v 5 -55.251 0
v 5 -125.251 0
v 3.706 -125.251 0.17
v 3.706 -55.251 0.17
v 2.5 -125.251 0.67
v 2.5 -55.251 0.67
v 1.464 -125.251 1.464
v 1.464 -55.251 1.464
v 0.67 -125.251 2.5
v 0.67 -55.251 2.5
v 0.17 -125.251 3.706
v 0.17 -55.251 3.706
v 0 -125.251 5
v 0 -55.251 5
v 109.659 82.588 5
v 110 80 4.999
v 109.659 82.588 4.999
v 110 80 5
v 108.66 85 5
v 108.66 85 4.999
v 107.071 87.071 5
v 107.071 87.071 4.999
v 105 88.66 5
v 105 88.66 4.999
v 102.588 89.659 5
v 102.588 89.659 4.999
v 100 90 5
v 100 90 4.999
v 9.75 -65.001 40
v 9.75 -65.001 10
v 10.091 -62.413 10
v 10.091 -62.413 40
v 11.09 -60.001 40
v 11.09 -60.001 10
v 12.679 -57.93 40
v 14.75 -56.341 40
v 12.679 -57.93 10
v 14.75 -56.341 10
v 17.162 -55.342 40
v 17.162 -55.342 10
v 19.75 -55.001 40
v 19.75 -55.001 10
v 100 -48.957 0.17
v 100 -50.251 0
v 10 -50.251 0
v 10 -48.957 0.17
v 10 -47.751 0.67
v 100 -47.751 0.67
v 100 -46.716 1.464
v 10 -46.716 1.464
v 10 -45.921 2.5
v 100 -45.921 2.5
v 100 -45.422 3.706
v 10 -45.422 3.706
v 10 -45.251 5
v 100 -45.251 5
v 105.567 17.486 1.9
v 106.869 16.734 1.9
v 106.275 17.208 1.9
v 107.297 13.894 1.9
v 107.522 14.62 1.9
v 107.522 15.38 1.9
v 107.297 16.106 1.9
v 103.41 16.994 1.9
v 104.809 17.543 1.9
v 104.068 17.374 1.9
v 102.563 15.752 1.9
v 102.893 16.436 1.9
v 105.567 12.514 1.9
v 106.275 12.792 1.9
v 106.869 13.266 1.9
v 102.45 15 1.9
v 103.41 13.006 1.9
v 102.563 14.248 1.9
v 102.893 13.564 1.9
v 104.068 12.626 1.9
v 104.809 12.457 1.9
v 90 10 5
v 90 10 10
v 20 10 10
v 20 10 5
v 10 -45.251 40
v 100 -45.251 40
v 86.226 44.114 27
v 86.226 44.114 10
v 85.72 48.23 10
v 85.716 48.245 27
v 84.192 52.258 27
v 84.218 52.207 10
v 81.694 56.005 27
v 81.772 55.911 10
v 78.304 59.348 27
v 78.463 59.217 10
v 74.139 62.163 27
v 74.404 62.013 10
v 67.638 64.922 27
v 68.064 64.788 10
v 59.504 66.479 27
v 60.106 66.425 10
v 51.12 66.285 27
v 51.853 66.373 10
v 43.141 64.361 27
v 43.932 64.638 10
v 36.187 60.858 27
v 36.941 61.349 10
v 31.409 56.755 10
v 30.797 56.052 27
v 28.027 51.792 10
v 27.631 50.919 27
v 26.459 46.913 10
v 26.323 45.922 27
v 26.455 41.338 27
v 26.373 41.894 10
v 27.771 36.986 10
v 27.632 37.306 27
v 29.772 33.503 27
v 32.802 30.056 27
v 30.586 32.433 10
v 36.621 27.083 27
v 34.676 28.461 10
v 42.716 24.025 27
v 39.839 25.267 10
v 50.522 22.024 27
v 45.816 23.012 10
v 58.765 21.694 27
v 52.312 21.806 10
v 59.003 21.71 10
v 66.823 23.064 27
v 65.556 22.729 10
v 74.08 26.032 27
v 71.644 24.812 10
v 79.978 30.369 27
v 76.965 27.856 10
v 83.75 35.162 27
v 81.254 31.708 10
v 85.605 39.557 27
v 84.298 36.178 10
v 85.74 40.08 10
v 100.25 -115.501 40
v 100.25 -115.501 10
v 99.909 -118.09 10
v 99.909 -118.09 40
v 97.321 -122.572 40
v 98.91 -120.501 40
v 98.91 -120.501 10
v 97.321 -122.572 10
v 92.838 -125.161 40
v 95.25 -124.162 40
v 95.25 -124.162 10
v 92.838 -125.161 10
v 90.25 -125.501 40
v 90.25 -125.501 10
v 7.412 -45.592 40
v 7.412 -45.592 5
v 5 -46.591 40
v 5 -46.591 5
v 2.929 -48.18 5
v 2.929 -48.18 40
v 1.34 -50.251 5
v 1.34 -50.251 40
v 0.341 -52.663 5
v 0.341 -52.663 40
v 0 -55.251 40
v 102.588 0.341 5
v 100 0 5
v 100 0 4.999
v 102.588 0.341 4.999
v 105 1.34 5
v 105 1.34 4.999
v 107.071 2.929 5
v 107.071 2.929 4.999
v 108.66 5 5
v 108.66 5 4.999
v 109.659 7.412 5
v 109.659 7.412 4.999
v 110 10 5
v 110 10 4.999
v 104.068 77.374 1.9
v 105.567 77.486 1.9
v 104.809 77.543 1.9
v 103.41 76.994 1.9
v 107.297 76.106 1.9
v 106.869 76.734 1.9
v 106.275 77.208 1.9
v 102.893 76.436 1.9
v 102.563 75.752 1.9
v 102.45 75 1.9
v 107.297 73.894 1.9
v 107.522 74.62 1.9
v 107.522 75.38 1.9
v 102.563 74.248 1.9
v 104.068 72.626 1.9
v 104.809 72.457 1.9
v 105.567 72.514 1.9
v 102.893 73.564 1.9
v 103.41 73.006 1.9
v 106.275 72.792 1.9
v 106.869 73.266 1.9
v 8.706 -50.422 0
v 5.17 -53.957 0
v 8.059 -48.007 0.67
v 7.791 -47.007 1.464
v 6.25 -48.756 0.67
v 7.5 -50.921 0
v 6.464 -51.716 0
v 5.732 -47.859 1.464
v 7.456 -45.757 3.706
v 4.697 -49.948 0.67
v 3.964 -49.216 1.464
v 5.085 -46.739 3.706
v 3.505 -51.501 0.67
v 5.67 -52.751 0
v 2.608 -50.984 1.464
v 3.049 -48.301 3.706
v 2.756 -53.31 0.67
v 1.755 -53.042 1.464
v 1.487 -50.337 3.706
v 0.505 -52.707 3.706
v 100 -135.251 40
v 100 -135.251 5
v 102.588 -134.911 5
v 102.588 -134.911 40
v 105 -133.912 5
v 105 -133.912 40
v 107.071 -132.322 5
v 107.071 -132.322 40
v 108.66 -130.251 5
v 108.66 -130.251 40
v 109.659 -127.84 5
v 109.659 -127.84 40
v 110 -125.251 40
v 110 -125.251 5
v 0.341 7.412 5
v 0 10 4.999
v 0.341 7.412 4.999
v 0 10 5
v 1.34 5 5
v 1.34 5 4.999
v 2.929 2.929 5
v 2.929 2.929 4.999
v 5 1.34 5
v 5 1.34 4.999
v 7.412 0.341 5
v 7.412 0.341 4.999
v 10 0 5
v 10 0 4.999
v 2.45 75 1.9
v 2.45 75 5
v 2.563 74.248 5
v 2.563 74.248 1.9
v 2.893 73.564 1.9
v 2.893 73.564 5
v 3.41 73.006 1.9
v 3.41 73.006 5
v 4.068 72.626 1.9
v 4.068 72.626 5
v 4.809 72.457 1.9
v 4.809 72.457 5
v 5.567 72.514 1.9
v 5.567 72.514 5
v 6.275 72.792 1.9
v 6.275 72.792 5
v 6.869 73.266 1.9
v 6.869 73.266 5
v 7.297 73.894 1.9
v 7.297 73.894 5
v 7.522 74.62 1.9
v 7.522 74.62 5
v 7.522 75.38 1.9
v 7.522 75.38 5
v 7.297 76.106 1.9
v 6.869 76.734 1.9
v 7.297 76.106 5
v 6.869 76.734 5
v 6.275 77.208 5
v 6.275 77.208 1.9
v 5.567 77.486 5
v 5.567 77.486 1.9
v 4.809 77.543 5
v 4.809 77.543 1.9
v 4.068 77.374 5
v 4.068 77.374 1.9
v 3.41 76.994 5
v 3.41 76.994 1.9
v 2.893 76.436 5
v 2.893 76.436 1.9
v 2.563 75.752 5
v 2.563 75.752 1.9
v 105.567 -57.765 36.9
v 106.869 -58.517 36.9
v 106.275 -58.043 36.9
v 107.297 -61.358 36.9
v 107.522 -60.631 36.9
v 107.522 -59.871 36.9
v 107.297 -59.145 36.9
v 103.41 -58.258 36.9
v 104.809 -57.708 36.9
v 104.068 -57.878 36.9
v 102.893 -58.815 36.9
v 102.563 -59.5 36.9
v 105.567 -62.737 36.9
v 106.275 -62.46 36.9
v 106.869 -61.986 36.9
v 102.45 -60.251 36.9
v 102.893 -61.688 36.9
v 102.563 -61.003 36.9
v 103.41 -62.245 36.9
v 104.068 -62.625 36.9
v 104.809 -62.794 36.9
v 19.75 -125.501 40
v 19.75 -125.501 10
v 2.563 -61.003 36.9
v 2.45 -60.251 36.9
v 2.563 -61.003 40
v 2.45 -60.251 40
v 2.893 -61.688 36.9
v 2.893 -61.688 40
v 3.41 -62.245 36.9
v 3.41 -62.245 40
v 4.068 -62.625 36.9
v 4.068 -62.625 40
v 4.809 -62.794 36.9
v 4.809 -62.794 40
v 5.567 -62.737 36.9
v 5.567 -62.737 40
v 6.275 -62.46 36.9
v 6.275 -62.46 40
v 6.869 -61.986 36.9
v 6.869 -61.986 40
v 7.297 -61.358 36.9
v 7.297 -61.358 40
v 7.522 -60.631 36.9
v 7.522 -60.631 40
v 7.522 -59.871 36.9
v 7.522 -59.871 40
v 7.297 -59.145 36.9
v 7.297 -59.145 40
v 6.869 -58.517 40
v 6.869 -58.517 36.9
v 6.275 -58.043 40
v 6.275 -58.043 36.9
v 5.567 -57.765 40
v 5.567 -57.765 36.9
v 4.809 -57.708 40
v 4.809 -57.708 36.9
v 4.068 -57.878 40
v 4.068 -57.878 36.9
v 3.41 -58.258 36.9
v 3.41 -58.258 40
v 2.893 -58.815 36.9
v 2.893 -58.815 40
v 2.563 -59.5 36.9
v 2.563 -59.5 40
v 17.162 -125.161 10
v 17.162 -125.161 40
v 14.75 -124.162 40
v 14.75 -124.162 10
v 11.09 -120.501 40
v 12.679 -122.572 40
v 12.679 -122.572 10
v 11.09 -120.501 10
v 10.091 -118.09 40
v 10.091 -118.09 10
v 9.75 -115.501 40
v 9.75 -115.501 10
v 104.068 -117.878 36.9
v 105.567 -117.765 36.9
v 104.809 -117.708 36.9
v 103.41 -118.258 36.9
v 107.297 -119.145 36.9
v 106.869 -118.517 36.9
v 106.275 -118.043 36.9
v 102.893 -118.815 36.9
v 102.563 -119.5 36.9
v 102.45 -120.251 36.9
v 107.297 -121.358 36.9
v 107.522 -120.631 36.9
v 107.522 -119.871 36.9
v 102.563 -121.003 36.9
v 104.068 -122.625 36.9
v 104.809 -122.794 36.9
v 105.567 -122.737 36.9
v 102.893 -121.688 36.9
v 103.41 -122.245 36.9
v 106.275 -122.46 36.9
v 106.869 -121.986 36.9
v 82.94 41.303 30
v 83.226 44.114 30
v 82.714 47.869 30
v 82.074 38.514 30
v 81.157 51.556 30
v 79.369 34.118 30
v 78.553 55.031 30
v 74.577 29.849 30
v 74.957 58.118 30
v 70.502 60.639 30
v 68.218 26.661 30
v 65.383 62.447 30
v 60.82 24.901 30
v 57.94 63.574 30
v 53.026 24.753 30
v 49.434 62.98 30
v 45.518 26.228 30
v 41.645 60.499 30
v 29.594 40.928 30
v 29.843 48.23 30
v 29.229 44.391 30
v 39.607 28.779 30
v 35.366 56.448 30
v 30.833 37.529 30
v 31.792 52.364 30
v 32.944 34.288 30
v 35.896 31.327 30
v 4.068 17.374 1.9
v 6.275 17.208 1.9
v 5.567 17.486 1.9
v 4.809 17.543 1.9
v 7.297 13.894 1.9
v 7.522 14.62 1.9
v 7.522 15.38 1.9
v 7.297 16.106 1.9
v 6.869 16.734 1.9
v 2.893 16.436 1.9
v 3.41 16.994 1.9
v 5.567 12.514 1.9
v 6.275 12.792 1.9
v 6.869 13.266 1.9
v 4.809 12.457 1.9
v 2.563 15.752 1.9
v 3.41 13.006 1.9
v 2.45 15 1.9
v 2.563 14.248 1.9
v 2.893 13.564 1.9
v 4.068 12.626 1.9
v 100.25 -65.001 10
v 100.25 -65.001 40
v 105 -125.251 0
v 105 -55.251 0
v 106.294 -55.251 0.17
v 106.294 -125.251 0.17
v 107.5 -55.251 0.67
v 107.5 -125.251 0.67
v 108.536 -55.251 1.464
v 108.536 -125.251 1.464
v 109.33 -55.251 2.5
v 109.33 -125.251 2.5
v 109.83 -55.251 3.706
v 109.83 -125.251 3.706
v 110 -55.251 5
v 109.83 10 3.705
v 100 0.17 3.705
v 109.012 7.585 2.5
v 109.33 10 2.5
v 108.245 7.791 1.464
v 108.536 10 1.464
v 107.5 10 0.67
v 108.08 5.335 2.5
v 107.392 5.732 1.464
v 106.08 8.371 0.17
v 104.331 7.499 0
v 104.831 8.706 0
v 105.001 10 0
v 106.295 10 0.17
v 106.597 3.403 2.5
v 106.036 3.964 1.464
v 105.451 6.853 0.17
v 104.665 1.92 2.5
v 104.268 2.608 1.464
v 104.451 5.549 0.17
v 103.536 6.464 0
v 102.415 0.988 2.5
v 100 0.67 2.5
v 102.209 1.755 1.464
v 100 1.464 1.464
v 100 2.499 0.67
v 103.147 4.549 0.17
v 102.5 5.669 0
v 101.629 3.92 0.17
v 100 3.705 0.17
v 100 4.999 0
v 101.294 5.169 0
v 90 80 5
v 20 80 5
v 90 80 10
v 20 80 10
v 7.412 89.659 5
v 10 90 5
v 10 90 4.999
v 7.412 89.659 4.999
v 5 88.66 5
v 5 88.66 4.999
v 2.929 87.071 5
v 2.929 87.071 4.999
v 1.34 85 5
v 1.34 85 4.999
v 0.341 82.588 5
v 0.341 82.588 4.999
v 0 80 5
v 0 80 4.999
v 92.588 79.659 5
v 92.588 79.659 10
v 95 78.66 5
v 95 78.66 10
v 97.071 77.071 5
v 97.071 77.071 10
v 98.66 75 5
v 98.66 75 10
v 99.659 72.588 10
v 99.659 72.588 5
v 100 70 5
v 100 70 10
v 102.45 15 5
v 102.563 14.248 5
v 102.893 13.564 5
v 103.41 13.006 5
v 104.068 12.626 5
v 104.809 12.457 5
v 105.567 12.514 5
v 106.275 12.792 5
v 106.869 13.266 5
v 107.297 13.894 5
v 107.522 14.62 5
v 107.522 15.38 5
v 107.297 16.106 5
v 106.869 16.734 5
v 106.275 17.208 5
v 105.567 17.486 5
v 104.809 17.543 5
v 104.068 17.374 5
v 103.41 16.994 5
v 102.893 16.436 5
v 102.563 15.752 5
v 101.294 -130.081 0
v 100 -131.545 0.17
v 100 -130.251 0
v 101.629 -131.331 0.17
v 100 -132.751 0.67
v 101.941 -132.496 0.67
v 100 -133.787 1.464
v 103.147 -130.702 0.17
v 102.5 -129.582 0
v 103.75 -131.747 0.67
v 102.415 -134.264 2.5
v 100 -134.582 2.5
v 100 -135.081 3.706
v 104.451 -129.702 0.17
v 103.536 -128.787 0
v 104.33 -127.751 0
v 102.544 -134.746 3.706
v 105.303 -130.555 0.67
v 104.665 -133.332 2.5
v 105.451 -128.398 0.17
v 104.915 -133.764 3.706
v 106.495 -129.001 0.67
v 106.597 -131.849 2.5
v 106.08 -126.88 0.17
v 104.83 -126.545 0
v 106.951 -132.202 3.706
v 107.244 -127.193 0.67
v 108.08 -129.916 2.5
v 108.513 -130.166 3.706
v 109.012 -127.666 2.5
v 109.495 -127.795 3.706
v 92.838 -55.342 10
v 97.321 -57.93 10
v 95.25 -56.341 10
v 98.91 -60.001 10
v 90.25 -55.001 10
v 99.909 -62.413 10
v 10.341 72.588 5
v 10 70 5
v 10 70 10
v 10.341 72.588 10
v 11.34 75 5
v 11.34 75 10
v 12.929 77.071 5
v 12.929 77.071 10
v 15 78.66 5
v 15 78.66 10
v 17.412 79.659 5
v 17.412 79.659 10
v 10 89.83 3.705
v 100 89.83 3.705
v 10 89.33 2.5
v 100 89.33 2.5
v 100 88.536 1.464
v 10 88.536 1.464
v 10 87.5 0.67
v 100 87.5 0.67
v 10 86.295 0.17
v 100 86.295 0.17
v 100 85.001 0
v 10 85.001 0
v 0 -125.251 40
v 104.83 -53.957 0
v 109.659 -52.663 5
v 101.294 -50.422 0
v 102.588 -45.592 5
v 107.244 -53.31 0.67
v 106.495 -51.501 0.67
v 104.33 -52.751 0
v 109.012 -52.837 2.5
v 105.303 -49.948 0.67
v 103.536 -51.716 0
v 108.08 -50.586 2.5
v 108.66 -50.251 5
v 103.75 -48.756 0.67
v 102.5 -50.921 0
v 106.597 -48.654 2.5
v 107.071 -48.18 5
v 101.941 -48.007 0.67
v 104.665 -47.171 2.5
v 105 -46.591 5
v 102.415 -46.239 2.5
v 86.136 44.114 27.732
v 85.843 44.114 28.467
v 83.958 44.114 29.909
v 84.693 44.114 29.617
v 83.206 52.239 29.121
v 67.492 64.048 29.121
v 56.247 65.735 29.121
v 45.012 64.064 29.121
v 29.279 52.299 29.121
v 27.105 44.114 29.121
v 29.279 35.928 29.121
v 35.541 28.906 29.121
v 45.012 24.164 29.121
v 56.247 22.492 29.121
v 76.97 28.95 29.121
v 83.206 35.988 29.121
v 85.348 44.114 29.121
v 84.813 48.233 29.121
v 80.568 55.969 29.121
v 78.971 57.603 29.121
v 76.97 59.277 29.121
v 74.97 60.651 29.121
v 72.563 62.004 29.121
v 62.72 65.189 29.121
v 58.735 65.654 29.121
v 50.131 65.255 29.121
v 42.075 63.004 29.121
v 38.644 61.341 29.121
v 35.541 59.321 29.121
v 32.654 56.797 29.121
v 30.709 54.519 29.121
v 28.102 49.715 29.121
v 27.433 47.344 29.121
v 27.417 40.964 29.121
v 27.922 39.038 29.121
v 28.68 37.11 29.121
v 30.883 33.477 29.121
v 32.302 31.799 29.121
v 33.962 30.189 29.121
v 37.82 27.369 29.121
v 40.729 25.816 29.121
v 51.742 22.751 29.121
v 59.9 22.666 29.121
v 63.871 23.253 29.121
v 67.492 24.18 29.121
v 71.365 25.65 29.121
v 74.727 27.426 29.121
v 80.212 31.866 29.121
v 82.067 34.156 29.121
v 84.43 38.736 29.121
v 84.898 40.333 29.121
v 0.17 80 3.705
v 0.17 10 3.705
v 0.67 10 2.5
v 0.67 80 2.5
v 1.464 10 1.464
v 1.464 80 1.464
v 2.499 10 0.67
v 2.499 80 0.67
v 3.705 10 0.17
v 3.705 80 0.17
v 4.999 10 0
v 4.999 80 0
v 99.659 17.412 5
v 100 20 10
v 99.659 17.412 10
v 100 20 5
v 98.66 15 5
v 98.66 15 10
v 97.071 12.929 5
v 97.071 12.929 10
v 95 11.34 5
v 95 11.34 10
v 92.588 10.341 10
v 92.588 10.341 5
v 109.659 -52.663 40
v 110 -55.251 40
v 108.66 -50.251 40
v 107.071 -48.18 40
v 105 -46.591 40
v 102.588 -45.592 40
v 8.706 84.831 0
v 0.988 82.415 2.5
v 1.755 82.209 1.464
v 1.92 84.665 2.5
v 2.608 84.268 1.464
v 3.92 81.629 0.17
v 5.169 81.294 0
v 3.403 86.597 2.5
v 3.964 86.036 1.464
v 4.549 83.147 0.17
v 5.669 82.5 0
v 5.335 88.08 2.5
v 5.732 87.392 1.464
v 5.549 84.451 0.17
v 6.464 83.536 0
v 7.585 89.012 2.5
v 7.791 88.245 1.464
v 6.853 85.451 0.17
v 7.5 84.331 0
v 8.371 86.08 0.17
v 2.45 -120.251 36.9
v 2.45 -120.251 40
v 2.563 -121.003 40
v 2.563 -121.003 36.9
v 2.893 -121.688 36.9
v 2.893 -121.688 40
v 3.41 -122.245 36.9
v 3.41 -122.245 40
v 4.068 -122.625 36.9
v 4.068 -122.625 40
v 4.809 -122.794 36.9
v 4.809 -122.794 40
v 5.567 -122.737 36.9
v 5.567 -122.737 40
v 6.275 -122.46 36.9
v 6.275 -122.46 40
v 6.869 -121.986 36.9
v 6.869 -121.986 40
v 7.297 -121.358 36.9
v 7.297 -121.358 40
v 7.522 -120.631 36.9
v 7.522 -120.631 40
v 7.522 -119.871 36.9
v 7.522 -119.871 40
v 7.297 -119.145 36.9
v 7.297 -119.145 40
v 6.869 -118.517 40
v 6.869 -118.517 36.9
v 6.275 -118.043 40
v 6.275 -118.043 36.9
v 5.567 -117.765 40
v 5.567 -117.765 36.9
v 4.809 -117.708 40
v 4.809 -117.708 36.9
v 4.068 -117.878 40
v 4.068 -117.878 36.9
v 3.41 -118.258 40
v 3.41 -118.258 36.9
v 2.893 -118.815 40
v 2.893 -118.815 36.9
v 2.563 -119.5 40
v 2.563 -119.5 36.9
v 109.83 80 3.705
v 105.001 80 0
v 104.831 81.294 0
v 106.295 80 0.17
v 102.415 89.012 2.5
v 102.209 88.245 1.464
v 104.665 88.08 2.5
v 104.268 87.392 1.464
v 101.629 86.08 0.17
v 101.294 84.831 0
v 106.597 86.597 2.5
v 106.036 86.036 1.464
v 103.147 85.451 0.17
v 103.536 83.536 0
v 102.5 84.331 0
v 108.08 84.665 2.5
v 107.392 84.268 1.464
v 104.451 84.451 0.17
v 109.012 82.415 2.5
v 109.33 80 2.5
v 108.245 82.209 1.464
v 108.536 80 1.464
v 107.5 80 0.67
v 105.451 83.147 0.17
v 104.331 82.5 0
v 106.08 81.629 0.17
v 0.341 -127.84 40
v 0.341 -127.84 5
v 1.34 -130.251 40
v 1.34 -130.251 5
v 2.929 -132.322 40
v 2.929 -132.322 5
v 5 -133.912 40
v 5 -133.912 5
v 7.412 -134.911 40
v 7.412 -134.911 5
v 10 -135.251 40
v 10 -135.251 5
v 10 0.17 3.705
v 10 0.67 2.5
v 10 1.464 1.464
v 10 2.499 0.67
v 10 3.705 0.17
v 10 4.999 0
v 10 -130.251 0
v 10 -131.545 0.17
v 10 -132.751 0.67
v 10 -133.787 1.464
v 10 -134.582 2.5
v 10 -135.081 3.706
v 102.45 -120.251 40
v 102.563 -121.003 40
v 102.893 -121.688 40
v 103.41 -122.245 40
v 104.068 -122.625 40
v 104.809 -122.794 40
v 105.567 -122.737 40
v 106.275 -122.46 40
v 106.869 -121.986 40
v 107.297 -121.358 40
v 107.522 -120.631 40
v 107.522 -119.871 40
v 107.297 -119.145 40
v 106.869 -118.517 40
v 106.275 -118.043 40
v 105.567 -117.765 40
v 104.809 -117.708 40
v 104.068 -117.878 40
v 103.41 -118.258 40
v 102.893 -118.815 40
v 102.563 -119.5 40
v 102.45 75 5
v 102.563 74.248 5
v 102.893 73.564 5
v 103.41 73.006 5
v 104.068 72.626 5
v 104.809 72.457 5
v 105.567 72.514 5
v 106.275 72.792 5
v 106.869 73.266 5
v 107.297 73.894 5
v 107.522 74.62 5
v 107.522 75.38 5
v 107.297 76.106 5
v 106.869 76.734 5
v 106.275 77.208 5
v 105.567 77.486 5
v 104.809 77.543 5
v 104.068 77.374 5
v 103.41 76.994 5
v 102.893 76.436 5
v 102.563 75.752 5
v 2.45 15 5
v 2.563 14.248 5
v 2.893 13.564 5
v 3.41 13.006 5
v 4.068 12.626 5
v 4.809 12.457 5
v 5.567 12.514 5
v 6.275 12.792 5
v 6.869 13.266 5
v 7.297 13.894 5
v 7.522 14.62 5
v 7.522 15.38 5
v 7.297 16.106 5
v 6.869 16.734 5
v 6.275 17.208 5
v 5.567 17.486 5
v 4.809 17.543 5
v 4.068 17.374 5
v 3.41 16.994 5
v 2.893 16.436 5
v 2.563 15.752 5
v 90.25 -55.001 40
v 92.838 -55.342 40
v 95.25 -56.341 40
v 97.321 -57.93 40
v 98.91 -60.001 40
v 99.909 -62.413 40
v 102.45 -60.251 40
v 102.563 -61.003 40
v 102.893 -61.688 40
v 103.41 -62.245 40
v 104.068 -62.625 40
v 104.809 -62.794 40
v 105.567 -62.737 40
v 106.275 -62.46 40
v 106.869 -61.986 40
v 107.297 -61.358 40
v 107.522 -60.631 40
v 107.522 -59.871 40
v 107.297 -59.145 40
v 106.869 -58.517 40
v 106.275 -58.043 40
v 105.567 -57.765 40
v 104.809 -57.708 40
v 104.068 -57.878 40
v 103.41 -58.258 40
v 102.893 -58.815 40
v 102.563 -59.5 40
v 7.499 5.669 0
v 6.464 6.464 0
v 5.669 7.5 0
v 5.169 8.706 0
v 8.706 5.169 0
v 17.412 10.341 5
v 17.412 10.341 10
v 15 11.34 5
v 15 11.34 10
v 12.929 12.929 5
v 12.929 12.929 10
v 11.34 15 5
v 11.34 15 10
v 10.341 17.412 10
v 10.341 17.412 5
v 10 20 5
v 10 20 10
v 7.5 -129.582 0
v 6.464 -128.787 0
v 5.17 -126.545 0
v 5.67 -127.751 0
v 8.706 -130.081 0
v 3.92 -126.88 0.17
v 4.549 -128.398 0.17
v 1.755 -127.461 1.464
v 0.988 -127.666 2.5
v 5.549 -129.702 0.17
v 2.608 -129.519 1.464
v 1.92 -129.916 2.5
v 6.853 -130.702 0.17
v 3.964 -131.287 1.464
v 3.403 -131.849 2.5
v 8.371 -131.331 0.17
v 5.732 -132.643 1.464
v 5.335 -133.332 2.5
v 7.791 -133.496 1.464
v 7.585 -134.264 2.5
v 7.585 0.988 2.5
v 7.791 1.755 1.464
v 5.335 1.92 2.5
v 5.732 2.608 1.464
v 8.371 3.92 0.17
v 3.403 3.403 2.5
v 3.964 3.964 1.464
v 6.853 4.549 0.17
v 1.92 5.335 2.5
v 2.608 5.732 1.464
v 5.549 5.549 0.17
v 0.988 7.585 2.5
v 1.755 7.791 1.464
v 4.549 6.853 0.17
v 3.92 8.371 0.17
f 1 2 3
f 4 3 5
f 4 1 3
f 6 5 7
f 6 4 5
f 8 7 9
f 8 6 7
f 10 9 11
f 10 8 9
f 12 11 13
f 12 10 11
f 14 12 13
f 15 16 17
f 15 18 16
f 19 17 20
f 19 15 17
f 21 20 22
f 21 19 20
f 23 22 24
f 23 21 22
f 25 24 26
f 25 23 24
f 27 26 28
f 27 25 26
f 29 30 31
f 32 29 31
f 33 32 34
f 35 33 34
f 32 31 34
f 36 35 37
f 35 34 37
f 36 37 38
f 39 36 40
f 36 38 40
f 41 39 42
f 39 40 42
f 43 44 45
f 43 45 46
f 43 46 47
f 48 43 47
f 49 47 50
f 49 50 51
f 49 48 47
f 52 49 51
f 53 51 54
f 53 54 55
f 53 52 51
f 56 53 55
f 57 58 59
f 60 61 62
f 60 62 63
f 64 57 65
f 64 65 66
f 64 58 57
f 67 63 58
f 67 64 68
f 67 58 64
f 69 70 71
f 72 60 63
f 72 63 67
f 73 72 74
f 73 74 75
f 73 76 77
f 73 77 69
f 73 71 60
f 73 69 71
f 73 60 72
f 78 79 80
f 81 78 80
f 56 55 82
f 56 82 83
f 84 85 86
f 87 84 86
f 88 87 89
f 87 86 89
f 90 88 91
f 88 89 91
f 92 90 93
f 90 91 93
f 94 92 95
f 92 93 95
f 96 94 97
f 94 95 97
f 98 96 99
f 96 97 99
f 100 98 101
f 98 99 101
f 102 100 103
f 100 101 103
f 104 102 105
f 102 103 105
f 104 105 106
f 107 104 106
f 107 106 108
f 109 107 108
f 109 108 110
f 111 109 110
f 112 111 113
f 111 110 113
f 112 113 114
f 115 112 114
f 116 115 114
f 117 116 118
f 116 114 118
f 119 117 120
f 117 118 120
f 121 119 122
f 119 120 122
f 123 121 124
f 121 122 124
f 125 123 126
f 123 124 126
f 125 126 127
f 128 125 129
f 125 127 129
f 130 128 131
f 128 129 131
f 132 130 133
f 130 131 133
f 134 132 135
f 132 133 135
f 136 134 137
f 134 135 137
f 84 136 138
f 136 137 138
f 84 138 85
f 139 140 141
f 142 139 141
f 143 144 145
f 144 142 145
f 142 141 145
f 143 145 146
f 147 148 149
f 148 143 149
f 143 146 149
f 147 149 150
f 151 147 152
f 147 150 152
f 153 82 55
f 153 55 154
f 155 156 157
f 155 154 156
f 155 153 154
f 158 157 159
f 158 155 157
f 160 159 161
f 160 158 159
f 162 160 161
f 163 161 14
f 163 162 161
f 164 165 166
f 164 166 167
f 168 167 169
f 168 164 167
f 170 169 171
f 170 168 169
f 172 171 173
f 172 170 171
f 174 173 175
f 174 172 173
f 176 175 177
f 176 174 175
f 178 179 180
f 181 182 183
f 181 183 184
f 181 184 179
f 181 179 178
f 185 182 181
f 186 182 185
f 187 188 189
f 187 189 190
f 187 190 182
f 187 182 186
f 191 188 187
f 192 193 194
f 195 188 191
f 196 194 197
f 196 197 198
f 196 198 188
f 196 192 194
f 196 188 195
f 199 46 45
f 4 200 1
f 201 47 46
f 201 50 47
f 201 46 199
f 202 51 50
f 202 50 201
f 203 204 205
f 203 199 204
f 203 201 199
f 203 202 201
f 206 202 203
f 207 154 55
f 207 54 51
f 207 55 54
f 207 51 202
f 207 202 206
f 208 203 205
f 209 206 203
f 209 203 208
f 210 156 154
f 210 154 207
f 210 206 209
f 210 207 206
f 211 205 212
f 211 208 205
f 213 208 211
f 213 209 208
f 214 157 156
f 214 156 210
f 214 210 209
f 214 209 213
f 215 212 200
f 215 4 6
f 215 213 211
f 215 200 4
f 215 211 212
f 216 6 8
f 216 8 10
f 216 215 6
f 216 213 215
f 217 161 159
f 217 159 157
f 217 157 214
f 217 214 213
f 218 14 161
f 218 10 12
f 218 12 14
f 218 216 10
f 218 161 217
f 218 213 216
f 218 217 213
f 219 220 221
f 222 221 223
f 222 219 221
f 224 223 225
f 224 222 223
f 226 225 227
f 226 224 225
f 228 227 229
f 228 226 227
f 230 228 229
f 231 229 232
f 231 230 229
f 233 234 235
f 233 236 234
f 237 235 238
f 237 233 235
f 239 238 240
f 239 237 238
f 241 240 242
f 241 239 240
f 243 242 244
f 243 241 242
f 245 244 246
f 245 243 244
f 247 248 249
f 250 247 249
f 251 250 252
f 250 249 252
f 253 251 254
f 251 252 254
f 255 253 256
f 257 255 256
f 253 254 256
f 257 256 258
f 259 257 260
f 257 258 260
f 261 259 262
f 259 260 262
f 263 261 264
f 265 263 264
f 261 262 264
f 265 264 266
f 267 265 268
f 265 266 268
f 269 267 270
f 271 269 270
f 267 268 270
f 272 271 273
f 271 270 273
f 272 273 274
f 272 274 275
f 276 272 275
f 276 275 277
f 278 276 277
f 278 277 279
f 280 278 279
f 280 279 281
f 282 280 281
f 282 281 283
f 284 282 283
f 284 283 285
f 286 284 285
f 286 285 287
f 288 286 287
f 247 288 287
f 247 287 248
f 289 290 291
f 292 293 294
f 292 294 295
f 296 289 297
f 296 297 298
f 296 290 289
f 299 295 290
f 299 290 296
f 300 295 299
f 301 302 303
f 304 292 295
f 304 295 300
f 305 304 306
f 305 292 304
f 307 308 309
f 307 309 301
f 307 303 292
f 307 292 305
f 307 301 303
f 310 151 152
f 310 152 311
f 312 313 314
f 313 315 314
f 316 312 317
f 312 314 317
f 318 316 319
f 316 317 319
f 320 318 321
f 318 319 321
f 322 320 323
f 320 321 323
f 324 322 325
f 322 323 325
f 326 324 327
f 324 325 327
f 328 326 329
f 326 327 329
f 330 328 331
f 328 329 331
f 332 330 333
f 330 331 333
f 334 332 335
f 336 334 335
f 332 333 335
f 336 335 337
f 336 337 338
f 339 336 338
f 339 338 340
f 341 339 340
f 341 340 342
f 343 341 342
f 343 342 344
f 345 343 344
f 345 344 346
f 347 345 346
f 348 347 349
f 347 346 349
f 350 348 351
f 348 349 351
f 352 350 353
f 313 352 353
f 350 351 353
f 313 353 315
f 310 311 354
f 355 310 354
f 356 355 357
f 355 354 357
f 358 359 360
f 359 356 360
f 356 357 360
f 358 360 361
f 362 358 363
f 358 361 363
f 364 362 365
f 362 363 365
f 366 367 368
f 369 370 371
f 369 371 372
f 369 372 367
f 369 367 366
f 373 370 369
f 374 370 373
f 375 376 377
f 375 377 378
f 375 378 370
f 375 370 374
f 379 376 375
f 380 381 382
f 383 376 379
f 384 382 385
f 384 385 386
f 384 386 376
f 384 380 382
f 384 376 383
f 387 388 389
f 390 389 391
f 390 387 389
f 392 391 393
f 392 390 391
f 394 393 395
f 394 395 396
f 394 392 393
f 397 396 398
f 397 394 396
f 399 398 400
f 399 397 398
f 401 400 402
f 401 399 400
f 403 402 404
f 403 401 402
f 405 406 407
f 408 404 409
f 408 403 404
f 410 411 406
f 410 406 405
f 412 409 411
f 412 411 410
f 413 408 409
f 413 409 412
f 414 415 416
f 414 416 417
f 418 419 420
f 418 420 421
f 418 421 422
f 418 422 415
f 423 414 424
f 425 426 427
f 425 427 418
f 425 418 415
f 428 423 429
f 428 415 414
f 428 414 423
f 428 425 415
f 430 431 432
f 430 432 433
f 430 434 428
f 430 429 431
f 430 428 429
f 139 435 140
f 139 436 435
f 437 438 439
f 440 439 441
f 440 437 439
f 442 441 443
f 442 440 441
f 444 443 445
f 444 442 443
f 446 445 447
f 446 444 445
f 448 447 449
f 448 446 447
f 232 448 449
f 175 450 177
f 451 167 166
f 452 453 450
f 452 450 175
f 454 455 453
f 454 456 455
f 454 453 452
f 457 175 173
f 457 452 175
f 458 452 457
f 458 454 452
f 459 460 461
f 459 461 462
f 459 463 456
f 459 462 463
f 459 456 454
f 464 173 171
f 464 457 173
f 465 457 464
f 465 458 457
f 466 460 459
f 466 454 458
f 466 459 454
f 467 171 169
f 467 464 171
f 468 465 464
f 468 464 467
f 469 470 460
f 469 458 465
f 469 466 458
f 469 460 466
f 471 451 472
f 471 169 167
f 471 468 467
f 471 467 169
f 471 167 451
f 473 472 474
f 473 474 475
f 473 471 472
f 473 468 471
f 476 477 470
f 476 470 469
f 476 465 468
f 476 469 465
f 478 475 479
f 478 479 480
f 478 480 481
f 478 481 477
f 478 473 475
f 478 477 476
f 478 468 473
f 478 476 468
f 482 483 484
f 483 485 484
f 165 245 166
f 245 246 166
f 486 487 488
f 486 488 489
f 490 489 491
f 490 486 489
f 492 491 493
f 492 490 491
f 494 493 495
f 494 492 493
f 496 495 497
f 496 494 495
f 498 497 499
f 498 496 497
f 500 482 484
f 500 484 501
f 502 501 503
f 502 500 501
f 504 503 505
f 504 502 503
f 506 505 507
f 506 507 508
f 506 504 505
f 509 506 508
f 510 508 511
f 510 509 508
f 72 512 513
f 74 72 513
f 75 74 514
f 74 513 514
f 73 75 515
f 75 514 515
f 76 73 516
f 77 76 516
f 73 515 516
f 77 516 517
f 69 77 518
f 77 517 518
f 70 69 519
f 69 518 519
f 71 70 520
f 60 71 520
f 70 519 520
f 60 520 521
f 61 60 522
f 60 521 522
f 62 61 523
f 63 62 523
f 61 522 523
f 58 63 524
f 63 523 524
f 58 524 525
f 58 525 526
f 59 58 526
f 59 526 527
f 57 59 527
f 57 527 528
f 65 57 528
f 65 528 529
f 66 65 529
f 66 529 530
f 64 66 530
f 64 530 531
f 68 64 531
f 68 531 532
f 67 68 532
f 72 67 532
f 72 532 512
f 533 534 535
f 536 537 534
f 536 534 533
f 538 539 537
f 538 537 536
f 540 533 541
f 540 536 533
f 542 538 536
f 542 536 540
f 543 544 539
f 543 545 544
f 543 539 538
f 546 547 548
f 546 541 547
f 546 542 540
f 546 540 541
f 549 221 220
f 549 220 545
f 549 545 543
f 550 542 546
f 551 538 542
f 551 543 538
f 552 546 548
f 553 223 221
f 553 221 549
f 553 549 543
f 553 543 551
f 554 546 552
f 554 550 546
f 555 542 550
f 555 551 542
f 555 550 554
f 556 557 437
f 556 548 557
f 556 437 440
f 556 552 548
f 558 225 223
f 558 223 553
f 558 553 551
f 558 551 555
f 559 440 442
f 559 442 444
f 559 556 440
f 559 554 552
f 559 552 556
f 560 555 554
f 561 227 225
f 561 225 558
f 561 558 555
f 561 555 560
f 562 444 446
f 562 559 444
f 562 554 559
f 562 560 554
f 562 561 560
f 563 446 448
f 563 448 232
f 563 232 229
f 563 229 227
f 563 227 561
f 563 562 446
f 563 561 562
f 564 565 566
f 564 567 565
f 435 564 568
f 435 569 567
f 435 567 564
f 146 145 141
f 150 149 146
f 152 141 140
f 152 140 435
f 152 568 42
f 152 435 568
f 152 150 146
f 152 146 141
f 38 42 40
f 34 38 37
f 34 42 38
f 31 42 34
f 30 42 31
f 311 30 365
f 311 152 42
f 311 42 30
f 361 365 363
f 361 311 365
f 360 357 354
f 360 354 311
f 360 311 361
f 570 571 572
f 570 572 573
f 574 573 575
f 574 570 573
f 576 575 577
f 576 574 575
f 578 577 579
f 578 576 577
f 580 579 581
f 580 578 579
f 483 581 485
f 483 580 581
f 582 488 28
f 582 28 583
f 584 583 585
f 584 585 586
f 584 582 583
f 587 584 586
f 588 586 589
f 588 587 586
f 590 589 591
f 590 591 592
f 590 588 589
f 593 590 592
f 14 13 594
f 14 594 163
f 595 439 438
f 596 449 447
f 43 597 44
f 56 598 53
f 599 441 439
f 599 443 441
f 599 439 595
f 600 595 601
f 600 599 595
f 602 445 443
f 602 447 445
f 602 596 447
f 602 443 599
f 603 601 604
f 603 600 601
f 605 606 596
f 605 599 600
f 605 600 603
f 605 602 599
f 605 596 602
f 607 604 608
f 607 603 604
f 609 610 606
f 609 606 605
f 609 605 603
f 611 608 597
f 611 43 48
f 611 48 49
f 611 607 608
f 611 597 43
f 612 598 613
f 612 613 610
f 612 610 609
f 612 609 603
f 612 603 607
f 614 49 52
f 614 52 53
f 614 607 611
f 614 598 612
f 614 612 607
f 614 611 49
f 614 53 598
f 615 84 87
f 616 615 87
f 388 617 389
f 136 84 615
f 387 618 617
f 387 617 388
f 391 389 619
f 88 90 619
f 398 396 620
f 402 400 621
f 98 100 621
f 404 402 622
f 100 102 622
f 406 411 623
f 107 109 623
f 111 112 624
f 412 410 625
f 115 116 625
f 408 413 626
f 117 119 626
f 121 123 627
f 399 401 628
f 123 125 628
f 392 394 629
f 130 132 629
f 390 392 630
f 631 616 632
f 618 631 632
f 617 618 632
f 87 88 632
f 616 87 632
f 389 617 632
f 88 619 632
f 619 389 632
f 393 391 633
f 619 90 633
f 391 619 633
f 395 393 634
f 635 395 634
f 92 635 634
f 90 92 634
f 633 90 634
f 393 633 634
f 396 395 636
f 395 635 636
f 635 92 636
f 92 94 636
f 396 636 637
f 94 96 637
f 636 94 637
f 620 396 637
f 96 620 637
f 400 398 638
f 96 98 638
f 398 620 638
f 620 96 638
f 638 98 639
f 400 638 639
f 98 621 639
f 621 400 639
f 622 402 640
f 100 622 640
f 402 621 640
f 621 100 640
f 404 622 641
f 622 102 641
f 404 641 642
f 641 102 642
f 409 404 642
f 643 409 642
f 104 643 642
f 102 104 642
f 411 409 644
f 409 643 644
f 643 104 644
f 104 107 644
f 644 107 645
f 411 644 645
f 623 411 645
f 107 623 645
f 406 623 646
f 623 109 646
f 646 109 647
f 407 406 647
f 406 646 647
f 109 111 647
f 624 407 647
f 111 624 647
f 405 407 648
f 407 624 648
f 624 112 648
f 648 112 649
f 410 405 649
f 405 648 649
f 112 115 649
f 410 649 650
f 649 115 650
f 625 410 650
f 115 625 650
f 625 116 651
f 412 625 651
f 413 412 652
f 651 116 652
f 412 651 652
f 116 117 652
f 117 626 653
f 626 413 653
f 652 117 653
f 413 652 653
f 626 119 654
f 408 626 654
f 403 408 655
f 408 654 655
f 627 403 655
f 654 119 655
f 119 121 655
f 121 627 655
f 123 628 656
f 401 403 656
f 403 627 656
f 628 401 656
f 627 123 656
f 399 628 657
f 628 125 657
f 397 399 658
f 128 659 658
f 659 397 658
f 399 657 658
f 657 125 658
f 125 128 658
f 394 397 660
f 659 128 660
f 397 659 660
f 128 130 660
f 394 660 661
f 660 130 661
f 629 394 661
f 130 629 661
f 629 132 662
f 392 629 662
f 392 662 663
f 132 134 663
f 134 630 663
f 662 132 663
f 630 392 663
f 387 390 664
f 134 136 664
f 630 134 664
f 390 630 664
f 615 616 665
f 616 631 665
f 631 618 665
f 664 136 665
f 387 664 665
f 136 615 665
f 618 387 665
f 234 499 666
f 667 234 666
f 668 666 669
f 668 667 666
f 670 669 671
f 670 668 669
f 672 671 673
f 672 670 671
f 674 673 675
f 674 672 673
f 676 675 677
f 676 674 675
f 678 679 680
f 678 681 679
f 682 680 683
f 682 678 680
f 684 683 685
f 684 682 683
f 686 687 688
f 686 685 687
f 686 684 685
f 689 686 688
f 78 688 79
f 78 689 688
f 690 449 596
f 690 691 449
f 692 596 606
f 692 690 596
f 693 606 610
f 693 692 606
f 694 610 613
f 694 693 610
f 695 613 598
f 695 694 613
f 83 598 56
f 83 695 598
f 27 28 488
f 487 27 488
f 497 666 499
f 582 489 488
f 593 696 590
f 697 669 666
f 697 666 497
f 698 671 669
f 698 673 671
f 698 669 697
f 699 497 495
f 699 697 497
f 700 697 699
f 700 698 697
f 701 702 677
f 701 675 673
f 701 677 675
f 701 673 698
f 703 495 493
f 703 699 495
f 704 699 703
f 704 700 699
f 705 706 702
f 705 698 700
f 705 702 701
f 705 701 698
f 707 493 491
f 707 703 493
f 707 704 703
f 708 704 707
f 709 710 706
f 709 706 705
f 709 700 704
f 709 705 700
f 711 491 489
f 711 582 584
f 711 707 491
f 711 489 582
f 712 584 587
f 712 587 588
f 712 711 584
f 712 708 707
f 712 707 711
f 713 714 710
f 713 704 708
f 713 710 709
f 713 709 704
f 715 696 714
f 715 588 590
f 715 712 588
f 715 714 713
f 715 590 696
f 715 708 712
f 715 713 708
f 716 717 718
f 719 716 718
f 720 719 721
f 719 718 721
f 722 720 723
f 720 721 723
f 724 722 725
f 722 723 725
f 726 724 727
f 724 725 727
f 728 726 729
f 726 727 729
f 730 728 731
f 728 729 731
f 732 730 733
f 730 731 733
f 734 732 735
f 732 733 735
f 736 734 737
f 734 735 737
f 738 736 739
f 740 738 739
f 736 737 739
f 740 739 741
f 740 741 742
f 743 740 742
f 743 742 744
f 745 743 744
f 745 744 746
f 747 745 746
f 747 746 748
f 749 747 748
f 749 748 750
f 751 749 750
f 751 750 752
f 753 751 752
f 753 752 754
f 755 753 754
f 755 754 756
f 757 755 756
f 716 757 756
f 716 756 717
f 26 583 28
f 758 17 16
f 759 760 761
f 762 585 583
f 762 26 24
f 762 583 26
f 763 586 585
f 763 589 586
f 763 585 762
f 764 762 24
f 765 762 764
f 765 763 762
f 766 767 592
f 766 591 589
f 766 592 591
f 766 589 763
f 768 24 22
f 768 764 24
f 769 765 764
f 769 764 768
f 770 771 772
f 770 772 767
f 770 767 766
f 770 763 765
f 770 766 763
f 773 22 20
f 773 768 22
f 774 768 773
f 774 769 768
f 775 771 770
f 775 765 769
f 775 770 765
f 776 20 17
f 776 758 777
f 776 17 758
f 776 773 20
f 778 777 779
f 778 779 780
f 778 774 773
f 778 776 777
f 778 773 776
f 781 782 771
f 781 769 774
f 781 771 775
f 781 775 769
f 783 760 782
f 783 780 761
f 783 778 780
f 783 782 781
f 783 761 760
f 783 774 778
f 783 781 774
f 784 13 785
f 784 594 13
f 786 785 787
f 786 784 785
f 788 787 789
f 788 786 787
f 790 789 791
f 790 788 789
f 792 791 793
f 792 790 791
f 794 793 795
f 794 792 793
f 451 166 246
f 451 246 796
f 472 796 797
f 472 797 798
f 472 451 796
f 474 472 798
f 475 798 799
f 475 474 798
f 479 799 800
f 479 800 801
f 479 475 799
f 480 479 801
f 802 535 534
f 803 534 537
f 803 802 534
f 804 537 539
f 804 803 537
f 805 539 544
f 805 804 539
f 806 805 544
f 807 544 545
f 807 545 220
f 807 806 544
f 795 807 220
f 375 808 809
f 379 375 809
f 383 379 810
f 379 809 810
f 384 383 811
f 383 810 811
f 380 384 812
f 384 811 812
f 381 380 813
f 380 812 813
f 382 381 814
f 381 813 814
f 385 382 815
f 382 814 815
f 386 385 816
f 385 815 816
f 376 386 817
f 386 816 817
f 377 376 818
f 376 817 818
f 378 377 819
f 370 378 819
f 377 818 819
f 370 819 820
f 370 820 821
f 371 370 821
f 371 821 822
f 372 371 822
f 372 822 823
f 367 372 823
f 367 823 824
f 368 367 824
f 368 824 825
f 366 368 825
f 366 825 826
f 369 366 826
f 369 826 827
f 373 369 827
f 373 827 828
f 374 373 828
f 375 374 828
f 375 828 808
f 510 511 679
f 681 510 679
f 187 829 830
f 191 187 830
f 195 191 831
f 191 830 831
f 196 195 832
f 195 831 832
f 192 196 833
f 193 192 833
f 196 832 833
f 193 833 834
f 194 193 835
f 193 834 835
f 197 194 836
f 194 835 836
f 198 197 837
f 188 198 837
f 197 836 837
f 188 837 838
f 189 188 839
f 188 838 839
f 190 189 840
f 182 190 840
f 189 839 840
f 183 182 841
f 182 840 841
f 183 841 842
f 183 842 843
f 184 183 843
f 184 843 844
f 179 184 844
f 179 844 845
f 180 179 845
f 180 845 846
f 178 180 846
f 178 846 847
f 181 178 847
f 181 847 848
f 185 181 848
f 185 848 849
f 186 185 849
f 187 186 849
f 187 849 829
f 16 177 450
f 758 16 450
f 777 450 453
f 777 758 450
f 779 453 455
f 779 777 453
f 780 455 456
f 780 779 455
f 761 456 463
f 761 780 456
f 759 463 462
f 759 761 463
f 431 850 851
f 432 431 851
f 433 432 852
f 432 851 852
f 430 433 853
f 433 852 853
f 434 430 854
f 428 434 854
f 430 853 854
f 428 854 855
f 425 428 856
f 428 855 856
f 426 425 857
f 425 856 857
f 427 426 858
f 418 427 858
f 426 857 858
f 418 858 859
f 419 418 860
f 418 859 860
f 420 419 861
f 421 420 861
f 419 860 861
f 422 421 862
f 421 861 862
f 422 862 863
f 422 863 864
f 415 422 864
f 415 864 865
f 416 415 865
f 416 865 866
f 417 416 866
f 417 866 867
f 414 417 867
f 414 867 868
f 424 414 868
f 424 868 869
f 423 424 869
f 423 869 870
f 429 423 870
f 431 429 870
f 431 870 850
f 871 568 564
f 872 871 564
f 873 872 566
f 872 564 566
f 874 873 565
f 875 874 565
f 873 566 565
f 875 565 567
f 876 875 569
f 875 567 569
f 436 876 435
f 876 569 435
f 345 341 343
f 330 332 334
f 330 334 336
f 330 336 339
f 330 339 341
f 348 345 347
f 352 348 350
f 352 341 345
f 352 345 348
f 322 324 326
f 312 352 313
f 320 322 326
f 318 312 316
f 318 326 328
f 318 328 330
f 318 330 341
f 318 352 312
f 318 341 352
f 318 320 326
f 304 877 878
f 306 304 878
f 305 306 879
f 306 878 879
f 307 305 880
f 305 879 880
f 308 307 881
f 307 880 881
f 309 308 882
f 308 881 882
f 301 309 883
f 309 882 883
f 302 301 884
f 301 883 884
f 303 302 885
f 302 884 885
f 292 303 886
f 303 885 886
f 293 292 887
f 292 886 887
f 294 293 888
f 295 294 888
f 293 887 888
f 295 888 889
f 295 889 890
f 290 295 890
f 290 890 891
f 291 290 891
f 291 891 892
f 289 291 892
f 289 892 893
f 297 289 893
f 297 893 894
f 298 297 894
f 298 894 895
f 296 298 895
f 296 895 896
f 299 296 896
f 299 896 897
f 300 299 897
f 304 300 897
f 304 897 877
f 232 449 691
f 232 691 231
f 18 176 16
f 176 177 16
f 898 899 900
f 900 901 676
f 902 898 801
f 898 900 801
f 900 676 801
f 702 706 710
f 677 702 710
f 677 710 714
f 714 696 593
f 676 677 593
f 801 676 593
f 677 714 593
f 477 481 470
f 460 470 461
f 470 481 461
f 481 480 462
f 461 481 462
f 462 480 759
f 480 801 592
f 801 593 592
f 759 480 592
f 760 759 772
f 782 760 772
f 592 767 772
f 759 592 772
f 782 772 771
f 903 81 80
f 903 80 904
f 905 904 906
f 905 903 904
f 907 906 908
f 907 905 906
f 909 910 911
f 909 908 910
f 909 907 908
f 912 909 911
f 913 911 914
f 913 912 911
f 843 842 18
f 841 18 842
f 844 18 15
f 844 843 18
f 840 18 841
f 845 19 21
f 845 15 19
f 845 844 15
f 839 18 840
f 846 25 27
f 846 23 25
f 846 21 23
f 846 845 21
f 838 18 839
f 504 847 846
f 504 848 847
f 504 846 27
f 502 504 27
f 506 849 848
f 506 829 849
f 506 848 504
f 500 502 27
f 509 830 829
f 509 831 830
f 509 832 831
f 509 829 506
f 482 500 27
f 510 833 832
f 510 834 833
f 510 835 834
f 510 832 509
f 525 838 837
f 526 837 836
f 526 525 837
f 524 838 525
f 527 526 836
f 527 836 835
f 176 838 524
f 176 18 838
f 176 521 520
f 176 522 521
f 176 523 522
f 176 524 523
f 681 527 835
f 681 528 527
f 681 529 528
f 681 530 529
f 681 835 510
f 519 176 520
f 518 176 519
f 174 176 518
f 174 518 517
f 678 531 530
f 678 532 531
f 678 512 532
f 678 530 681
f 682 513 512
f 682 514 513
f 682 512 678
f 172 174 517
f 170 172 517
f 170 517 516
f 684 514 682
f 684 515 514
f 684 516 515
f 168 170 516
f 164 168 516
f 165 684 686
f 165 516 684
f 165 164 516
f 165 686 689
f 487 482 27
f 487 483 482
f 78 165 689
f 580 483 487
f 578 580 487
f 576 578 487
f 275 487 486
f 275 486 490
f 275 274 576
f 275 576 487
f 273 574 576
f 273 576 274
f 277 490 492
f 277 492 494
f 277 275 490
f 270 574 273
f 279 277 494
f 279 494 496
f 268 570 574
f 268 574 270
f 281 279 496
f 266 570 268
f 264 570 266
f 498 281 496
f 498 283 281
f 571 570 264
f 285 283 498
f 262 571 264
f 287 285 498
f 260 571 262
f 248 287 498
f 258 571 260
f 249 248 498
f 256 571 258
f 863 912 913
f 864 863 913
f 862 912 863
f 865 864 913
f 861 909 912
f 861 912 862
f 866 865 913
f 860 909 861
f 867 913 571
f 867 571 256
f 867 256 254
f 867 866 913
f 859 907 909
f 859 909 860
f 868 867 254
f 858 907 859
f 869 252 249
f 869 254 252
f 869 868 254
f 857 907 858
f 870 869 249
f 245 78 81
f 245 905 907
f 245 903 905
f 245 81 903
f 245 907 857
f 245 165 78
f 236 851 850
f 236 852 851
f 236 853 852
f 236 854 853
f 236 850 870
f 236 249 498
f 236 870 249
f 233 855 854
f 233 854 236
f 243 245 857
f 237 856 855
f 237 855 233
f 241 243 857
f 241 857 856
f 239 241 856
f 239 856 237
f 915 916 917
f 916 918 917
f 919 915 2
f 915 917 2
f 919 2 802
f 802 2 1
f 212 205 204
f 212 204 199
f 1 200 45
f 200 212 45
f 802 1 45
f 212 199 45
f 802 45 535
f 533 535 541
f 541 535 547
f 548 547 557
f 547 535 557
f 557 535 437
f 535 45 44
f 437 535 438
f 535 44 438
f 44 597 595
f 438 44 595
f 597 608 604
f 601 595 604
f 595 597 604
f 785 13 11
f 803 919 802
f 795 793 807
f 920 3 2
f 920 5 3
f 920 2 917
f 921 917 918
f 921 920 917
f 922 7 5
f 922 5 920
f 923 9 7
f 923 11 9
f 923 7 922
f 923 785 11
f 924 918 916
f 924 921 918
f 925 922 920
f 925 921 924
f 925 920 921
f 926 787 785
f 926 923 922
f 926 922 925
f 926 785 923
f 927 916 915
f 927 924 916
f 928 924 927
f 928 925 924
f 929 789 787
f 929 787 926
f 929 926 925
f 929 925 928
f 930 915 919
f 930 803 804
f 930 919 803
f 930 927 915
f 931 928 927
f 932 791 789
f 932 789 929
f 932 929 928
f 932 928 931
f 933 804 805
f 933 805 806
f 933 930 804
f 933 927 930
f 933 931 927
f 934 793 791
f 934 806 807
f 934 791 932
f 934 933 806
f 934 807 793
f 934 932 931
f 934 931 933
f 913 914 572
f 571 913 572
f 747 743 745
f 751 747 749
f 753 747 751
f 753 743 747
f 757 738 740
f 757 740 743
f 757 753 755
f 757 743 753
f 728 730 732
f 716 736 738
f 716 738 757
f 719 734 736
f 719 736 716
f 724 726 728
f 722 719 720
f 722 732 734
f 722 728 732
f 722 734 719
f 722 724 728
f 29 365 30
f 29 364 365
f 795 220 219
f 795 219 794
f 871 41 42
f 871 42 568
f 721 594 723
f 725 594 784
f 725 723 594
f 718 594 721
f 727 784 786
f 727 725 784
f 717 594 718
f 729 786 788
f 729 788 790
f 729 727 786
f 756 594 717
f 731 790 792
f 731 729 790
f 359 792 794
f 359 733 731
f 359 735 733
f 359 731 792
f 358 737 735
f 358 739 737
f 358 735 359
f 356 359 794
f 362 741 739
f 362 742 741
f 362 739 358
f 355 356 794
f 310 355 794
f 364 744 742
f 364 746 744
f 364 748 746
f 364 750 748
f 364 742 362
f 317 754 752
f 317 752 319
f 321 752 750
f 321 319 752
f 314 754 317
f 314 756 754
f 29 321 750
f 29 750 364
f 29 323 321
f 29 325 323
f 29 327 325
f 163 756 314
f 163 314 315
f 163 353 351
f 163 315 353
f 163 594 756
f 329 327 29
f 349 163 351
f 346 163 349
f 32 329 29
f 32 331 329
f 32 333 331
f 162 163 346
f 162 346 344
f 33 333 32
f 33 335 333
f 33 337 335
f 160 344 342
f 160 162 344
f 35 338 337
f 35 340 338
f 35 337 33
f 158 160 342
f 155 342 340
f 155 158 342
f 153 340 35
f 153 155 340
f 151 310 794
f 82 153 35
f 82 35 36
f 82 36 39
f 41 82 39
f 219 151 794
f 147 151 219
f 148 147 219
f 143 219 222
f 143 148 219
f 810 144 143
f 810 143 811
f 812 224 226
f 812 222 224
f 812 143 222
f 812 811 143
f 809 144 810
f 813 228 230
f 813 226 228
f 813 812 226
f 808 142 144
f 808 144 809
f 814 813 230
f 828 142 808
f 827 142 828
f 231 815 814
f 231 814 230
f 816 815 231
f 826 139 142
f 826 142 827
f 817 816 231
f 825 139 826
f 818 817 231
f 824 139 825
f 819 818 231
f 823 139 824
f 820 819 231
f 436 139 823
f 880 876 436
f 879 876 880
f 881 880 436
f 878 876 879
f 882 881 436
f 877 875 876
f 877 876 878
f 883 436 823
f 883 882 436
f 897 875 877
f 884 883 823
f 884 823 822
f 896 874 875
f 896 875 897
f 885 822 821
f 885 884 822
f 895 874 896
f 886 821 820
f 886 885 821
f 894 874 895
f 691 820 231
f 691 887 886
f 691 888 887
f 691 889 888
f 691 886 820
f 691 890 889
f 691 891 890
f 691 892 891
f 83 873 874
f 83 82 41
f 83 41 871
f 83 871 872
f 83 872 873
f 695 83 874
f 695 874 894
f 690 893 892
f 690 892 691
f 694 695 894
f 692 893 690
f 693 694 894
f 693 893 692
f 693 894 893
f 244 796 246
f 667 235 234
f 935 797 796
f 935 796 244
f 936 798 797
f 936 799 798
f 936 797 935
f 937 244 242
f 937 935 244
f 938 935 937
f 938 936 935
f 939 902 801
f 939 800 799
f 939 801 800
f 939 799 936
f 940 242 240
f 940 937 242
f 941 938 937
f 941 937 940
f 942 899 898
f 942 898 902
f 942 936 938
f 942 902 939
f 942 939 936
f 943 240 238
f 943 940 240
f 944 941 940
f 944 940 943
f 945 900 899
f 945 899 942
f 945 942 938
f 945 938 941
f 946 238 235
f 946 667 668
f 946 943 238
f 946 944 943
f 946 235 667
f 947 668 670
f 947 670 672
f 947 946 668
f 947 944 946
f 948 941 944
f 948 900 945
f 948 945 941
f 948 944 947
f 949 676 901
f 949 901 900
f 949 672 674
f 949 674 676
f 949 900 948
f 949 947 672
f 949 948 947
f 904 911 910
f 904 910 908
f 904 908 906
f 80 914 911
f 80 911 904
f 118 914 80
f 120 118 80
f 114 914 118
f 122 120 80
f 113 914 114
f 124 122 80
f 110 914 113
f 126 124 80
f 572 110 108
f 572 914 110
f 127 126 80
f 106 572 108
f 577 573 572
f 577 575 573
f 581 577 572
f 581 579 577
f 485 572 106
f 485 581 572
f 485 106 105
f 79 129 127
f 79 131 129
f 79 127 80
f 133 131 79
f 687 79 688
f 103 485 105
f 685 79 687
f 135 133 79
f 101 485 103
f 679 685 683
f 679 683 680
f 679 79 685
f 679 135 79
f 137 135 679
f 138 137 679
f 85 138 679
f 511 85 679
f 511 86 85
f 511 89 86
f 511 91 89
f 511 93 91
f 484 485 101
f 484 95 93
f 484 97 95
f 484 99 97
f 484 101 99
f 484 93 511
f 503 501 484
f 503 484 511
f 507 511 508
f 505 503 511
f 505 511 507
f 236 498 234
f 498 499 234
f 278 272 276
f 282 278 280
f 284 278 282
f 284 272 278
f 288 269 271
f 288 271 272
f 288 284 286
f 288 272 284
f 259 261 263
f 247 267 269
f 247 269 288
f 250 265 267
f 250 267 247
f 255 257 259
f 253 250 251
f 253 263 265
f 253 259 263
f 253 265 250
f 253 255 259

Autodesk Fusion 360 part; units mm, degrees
sketch "Sketch1" plane through (0, 0, 0) normal (0, 0, 1) x (1, 0, 0) in component "Base"
  line L0 (0, 0) -> (110, 0)
  line L1 (110, 0) -> (110, 90)
  line L2 (110, 90) -> (0, 90)
  line L3 (0, 90) -> (0, 0)
  dimension "d1" = 110
  dimension "d2" = 90
extrude "Extrude1" add sketch "Sketch1" along normal blind 10 makes body 1 in component "Base"
sketch "Sketch5" plane through (0, 0, 10) normal (0, 0, 1) x (-1, 0, 0) in component "Base"
  line L0 (0, -90) -> (0, 0)
  line L1 (0, 0) -> (-110, 0)
  line L2 (-110, 0) -> (-110, -90)
  line L3 (-110, -90) -> (0, -90)
  line L4 (0, -90) -> (-110, -90)
  line L5 (-110, -90) -> (-110, 0)
  line L6 (-110, 0) -> (0, 0)
  line L7 (0, 0) -> (0, -90)
  line L8 (-10, -80) -> (-100, -80)
  line L9 (-100, -80) -> (-100, -10)
  line L10 (-100, -10) -> (-10, -10)
  line L11 (-10, -10) -> (-10, -80)
  dimension "d30" = 110
  dimension "d31" = 90
  dimension "d32" = 70
  dimension "d33" = 90
  dimension "d34" = 10
  dimension "d35" = 10
  dimension "d36" = 10
  dimension "d37" = 10
extrude "Extrude5" cut sketch "Sketch5" against normal blind 5 bodies 1 in component "Base"
sketch "Sketch6" plane through (0, 0, 10) normal (0, 0, 1) x (-1, 0, 0) in component "Base"
  line L0 (-10, -80) -> (-10, -10)
  line L1 (-10, -10) -> (-100, -10)
  line L2 (-100, -10) -> (-100, -80)
  line L3 (-100, -80) -> (-10, -80)
  ellipse E0 centre (-56.2263, -44.1137) end of major axis (-86.2263, -44.1137) minor radius 22.5
  line L4 (-26.2263, -44.1137) -> (-86.2263, -44.1137) construction
  line L5 (-56.2263, -21.6137) -> (-56.2263, -66.6137) construction
  dimension "d40" = 60
  dimension "d41" = 45
extrude "Extrude6" add sketch "Sketch6" along normal blind 20 contours E0 bodies 1 in component "Base"
sketch "Sketch7" plane through (0, 0, 5) normal (0, 0, 1) x (-1, 0, 0) in component "Base"
  line L0 (-100, -10) -> (-10, -10)
  line L1 (-10, -10) -> (-10, -80)
  line L2 (-10, -80) -> (-100, -80)
  line L3 (-100, -80) -> (-100, -10)
  line L4 (0, 0) -> (-110, 0)
  line L5 (-110, 0) -> (-110, -90)
  line L6 (-110, -90) -> (0, -90)
  line L7 (0, -90) -> (0, 0)
  circle A0 centre (-5, -15) radius 2.55
  circle A1 centre (-5, -75) radius 2.55
  circle A2 centre (-105, -75) radius 2.55
  circle A3 centre (-105, -15) radius 2.55
  dimension "d45" = 5.1
  dimension "d46" = 5.1
  dimension "d47" = 5.1
  dimension "d48" = 5.1
  dimension "d49" = 5
  dimension "d50" = 5
  dimension "d51" = 5
  dimension "d52" = 5
  dimension "d53" = 60
  dimension "d54" = 60
  dimension "d55" = 15
  dimension "d56" = 15
extrude "Extrude7" cut sketch "Sketch7" against normal blind 3.1 contours A0 | A1 | A2 | A3 bodies 1 in component "Base"
sketch "Sketch1 (2)" plane through (0, 0, 0) normal (0, 0, 1) x (1, 0, 0) in component "Lid"
  line L0 (0, -45.2514) -> (110, -45.2514)
  line L1 (110, -45.2514) -> (110, -135.2514)
  line L2 (110, -135.2514) -> (0, -135.2514)
  line L3 (0, -135.2514) -> (0, -45.2514)
  dimension "d59" = 110
  dimension "d60" = 90
extrude "Extrude1'" add sketch "Sketch1 (2)" along normal blind 40 separate body makes body 2 in component "Lid"
sketch "Sketch2" plane through (0, 0, 40) normal (0, 0, 1) x (-1, 0, 0) in component "Lid"
  line L0 (0, 135.2514) -> (-110, 135.2514)
  line L1 (-110, 135.2514) -> (-110, 45.2514)
  line L2 (-110, 45.2514) -> (0, 45.2514)
  line L3 (0, 45.2514) -> (0, 135.2514)
  line L4 (-9.75, 55.0014) -> (-100.25, 55.0014)
  line L5 (-100.25, 55.0014) -> (-100.25, 125.5014)
  line L6 (-100.25, 125.5014) -> (-9.75, 125.5014)
  line L7 (-9.75, 125.5014) -> (-9.75, 55.0014)
  dimension "d63" = 90.5
  dimension "d64" = 70.5
  dimension "d65" = 9.75
  dimension "d66" = 9.75
  dimension "d67" = 9.75
  dimension "d68" = 9.75
extrude "Extrude2" cut sketch "Sketch2" against normal blind 30 contours L4 L5 L6 L7 bodies 2 in component "Lid"
fillet "Fillet1" radius 3 1 edges at (26.2263, 44.1137, 30) on bodies 1 in component "Base"
fillet "Fillet2" radius 10 8 edges at (0, 0, 2.5) (0, 90, 2.5) (110, 90, 2.5) (110, 0, 2.5) (100, 10, 7.5) (100, 80, 7.5) (10, 80, 7.5) (10, 10, 7.5) on bodies 1 in component "Base"
sketch "Sketch4" plane through (0, -45.5027, 40) normal (0, 0, 1) x (-1, 0, 0) in component "Lid"
  line L0 (-100.25, 9.4986) -> (-100.25, 79.9986)
  line L1 (-100.25, 79.9986) -> (-9.75, 79.9986)
  line L2 (-9.75, 79.9986) -> (-9.75, 9.4986)
  line L3 (-9.75, 9.4986) -> (-100.25, 9.4986)
  line L4 (0, 89.7486) -> (-110, 89.7486)
  line L5 (-110, 89.7486) -> (-110, -0.2514)
  line L6 (-110, -0.2514) -> (0, -0.2514)
  line L7 (0, -0.2514) -> (0, 89.7486)
  circle A0 centre (-105, 74.7486) radius 2.55
  circle A1 centre (-105, 14.7486) radius 2.55
  circle A2 centre (-5, 74.7486) radius 2.55
  circle A3 centre (-5, 14.7486) radius 2.55
  dimension "d89" = 5.1
  dimension "d90" = 5.1
  dimension "d91" = 5.1
  dimension "d92" = 5.1
  dimension "d93" = 5
  dimension "d94" = 5
  dimension "d95" = 5
  dimension "d96" = 5
  dimension "d97" = 60
  dimension "d98" = 60
  dimension "d99" = 15
  dimension "d100" = 15
extrude "Extrude3" cut sketch "Sketch4" against normal blind 3.1 contours A0 | A1 | A2 | A3 bodies 2 in component "Lid"
fillet "Fillet2'" radius 10 8 edges at (0, -45.2514, 20) (0, -135.2514, 20) (110, -45.2514, 20) (100.25, -125.5014, 25) (9.75, -55.0014, 25) (110, -135.2514, 20) (9.75, -125.5014, 25) (100.25, -55.0014, 25) on bodies 2 in component "Lid"
fillet "Fillet3" radius 5 8 edges at (107.0711, -48.1803, 0) (110, -90.2514, 0) (107.0711, -132.3224, 0) (55, -135.2514, 0) (2.9289, -132.3224, 0) (0, -90.2514, 0) (2.9289, -48.1803, 0) (55, -45.2514, 0) on bodies 2 in component "Lid"
fillet "Fillet3'" radius 5 8 edges at (0, 45, 0) (2.9289, 2.9289, 0) (55, 0, 0) (107.0711, 2.9289, 0) (110, 45, 0) (107.0711, 87.0711, 0) (55, 90, 0) (2.9289, 87.0711, 0) on bodies 1 in component "Base"
component "Base" placed x (1, 0, 0) y (0, 1, 0) z (0, 0, 1) at (0, 0, 0)
component "Lid" placed x (1, 0, 0) y (0, 1, 0) z (0, 0, 1) at (0, 0, 0)
